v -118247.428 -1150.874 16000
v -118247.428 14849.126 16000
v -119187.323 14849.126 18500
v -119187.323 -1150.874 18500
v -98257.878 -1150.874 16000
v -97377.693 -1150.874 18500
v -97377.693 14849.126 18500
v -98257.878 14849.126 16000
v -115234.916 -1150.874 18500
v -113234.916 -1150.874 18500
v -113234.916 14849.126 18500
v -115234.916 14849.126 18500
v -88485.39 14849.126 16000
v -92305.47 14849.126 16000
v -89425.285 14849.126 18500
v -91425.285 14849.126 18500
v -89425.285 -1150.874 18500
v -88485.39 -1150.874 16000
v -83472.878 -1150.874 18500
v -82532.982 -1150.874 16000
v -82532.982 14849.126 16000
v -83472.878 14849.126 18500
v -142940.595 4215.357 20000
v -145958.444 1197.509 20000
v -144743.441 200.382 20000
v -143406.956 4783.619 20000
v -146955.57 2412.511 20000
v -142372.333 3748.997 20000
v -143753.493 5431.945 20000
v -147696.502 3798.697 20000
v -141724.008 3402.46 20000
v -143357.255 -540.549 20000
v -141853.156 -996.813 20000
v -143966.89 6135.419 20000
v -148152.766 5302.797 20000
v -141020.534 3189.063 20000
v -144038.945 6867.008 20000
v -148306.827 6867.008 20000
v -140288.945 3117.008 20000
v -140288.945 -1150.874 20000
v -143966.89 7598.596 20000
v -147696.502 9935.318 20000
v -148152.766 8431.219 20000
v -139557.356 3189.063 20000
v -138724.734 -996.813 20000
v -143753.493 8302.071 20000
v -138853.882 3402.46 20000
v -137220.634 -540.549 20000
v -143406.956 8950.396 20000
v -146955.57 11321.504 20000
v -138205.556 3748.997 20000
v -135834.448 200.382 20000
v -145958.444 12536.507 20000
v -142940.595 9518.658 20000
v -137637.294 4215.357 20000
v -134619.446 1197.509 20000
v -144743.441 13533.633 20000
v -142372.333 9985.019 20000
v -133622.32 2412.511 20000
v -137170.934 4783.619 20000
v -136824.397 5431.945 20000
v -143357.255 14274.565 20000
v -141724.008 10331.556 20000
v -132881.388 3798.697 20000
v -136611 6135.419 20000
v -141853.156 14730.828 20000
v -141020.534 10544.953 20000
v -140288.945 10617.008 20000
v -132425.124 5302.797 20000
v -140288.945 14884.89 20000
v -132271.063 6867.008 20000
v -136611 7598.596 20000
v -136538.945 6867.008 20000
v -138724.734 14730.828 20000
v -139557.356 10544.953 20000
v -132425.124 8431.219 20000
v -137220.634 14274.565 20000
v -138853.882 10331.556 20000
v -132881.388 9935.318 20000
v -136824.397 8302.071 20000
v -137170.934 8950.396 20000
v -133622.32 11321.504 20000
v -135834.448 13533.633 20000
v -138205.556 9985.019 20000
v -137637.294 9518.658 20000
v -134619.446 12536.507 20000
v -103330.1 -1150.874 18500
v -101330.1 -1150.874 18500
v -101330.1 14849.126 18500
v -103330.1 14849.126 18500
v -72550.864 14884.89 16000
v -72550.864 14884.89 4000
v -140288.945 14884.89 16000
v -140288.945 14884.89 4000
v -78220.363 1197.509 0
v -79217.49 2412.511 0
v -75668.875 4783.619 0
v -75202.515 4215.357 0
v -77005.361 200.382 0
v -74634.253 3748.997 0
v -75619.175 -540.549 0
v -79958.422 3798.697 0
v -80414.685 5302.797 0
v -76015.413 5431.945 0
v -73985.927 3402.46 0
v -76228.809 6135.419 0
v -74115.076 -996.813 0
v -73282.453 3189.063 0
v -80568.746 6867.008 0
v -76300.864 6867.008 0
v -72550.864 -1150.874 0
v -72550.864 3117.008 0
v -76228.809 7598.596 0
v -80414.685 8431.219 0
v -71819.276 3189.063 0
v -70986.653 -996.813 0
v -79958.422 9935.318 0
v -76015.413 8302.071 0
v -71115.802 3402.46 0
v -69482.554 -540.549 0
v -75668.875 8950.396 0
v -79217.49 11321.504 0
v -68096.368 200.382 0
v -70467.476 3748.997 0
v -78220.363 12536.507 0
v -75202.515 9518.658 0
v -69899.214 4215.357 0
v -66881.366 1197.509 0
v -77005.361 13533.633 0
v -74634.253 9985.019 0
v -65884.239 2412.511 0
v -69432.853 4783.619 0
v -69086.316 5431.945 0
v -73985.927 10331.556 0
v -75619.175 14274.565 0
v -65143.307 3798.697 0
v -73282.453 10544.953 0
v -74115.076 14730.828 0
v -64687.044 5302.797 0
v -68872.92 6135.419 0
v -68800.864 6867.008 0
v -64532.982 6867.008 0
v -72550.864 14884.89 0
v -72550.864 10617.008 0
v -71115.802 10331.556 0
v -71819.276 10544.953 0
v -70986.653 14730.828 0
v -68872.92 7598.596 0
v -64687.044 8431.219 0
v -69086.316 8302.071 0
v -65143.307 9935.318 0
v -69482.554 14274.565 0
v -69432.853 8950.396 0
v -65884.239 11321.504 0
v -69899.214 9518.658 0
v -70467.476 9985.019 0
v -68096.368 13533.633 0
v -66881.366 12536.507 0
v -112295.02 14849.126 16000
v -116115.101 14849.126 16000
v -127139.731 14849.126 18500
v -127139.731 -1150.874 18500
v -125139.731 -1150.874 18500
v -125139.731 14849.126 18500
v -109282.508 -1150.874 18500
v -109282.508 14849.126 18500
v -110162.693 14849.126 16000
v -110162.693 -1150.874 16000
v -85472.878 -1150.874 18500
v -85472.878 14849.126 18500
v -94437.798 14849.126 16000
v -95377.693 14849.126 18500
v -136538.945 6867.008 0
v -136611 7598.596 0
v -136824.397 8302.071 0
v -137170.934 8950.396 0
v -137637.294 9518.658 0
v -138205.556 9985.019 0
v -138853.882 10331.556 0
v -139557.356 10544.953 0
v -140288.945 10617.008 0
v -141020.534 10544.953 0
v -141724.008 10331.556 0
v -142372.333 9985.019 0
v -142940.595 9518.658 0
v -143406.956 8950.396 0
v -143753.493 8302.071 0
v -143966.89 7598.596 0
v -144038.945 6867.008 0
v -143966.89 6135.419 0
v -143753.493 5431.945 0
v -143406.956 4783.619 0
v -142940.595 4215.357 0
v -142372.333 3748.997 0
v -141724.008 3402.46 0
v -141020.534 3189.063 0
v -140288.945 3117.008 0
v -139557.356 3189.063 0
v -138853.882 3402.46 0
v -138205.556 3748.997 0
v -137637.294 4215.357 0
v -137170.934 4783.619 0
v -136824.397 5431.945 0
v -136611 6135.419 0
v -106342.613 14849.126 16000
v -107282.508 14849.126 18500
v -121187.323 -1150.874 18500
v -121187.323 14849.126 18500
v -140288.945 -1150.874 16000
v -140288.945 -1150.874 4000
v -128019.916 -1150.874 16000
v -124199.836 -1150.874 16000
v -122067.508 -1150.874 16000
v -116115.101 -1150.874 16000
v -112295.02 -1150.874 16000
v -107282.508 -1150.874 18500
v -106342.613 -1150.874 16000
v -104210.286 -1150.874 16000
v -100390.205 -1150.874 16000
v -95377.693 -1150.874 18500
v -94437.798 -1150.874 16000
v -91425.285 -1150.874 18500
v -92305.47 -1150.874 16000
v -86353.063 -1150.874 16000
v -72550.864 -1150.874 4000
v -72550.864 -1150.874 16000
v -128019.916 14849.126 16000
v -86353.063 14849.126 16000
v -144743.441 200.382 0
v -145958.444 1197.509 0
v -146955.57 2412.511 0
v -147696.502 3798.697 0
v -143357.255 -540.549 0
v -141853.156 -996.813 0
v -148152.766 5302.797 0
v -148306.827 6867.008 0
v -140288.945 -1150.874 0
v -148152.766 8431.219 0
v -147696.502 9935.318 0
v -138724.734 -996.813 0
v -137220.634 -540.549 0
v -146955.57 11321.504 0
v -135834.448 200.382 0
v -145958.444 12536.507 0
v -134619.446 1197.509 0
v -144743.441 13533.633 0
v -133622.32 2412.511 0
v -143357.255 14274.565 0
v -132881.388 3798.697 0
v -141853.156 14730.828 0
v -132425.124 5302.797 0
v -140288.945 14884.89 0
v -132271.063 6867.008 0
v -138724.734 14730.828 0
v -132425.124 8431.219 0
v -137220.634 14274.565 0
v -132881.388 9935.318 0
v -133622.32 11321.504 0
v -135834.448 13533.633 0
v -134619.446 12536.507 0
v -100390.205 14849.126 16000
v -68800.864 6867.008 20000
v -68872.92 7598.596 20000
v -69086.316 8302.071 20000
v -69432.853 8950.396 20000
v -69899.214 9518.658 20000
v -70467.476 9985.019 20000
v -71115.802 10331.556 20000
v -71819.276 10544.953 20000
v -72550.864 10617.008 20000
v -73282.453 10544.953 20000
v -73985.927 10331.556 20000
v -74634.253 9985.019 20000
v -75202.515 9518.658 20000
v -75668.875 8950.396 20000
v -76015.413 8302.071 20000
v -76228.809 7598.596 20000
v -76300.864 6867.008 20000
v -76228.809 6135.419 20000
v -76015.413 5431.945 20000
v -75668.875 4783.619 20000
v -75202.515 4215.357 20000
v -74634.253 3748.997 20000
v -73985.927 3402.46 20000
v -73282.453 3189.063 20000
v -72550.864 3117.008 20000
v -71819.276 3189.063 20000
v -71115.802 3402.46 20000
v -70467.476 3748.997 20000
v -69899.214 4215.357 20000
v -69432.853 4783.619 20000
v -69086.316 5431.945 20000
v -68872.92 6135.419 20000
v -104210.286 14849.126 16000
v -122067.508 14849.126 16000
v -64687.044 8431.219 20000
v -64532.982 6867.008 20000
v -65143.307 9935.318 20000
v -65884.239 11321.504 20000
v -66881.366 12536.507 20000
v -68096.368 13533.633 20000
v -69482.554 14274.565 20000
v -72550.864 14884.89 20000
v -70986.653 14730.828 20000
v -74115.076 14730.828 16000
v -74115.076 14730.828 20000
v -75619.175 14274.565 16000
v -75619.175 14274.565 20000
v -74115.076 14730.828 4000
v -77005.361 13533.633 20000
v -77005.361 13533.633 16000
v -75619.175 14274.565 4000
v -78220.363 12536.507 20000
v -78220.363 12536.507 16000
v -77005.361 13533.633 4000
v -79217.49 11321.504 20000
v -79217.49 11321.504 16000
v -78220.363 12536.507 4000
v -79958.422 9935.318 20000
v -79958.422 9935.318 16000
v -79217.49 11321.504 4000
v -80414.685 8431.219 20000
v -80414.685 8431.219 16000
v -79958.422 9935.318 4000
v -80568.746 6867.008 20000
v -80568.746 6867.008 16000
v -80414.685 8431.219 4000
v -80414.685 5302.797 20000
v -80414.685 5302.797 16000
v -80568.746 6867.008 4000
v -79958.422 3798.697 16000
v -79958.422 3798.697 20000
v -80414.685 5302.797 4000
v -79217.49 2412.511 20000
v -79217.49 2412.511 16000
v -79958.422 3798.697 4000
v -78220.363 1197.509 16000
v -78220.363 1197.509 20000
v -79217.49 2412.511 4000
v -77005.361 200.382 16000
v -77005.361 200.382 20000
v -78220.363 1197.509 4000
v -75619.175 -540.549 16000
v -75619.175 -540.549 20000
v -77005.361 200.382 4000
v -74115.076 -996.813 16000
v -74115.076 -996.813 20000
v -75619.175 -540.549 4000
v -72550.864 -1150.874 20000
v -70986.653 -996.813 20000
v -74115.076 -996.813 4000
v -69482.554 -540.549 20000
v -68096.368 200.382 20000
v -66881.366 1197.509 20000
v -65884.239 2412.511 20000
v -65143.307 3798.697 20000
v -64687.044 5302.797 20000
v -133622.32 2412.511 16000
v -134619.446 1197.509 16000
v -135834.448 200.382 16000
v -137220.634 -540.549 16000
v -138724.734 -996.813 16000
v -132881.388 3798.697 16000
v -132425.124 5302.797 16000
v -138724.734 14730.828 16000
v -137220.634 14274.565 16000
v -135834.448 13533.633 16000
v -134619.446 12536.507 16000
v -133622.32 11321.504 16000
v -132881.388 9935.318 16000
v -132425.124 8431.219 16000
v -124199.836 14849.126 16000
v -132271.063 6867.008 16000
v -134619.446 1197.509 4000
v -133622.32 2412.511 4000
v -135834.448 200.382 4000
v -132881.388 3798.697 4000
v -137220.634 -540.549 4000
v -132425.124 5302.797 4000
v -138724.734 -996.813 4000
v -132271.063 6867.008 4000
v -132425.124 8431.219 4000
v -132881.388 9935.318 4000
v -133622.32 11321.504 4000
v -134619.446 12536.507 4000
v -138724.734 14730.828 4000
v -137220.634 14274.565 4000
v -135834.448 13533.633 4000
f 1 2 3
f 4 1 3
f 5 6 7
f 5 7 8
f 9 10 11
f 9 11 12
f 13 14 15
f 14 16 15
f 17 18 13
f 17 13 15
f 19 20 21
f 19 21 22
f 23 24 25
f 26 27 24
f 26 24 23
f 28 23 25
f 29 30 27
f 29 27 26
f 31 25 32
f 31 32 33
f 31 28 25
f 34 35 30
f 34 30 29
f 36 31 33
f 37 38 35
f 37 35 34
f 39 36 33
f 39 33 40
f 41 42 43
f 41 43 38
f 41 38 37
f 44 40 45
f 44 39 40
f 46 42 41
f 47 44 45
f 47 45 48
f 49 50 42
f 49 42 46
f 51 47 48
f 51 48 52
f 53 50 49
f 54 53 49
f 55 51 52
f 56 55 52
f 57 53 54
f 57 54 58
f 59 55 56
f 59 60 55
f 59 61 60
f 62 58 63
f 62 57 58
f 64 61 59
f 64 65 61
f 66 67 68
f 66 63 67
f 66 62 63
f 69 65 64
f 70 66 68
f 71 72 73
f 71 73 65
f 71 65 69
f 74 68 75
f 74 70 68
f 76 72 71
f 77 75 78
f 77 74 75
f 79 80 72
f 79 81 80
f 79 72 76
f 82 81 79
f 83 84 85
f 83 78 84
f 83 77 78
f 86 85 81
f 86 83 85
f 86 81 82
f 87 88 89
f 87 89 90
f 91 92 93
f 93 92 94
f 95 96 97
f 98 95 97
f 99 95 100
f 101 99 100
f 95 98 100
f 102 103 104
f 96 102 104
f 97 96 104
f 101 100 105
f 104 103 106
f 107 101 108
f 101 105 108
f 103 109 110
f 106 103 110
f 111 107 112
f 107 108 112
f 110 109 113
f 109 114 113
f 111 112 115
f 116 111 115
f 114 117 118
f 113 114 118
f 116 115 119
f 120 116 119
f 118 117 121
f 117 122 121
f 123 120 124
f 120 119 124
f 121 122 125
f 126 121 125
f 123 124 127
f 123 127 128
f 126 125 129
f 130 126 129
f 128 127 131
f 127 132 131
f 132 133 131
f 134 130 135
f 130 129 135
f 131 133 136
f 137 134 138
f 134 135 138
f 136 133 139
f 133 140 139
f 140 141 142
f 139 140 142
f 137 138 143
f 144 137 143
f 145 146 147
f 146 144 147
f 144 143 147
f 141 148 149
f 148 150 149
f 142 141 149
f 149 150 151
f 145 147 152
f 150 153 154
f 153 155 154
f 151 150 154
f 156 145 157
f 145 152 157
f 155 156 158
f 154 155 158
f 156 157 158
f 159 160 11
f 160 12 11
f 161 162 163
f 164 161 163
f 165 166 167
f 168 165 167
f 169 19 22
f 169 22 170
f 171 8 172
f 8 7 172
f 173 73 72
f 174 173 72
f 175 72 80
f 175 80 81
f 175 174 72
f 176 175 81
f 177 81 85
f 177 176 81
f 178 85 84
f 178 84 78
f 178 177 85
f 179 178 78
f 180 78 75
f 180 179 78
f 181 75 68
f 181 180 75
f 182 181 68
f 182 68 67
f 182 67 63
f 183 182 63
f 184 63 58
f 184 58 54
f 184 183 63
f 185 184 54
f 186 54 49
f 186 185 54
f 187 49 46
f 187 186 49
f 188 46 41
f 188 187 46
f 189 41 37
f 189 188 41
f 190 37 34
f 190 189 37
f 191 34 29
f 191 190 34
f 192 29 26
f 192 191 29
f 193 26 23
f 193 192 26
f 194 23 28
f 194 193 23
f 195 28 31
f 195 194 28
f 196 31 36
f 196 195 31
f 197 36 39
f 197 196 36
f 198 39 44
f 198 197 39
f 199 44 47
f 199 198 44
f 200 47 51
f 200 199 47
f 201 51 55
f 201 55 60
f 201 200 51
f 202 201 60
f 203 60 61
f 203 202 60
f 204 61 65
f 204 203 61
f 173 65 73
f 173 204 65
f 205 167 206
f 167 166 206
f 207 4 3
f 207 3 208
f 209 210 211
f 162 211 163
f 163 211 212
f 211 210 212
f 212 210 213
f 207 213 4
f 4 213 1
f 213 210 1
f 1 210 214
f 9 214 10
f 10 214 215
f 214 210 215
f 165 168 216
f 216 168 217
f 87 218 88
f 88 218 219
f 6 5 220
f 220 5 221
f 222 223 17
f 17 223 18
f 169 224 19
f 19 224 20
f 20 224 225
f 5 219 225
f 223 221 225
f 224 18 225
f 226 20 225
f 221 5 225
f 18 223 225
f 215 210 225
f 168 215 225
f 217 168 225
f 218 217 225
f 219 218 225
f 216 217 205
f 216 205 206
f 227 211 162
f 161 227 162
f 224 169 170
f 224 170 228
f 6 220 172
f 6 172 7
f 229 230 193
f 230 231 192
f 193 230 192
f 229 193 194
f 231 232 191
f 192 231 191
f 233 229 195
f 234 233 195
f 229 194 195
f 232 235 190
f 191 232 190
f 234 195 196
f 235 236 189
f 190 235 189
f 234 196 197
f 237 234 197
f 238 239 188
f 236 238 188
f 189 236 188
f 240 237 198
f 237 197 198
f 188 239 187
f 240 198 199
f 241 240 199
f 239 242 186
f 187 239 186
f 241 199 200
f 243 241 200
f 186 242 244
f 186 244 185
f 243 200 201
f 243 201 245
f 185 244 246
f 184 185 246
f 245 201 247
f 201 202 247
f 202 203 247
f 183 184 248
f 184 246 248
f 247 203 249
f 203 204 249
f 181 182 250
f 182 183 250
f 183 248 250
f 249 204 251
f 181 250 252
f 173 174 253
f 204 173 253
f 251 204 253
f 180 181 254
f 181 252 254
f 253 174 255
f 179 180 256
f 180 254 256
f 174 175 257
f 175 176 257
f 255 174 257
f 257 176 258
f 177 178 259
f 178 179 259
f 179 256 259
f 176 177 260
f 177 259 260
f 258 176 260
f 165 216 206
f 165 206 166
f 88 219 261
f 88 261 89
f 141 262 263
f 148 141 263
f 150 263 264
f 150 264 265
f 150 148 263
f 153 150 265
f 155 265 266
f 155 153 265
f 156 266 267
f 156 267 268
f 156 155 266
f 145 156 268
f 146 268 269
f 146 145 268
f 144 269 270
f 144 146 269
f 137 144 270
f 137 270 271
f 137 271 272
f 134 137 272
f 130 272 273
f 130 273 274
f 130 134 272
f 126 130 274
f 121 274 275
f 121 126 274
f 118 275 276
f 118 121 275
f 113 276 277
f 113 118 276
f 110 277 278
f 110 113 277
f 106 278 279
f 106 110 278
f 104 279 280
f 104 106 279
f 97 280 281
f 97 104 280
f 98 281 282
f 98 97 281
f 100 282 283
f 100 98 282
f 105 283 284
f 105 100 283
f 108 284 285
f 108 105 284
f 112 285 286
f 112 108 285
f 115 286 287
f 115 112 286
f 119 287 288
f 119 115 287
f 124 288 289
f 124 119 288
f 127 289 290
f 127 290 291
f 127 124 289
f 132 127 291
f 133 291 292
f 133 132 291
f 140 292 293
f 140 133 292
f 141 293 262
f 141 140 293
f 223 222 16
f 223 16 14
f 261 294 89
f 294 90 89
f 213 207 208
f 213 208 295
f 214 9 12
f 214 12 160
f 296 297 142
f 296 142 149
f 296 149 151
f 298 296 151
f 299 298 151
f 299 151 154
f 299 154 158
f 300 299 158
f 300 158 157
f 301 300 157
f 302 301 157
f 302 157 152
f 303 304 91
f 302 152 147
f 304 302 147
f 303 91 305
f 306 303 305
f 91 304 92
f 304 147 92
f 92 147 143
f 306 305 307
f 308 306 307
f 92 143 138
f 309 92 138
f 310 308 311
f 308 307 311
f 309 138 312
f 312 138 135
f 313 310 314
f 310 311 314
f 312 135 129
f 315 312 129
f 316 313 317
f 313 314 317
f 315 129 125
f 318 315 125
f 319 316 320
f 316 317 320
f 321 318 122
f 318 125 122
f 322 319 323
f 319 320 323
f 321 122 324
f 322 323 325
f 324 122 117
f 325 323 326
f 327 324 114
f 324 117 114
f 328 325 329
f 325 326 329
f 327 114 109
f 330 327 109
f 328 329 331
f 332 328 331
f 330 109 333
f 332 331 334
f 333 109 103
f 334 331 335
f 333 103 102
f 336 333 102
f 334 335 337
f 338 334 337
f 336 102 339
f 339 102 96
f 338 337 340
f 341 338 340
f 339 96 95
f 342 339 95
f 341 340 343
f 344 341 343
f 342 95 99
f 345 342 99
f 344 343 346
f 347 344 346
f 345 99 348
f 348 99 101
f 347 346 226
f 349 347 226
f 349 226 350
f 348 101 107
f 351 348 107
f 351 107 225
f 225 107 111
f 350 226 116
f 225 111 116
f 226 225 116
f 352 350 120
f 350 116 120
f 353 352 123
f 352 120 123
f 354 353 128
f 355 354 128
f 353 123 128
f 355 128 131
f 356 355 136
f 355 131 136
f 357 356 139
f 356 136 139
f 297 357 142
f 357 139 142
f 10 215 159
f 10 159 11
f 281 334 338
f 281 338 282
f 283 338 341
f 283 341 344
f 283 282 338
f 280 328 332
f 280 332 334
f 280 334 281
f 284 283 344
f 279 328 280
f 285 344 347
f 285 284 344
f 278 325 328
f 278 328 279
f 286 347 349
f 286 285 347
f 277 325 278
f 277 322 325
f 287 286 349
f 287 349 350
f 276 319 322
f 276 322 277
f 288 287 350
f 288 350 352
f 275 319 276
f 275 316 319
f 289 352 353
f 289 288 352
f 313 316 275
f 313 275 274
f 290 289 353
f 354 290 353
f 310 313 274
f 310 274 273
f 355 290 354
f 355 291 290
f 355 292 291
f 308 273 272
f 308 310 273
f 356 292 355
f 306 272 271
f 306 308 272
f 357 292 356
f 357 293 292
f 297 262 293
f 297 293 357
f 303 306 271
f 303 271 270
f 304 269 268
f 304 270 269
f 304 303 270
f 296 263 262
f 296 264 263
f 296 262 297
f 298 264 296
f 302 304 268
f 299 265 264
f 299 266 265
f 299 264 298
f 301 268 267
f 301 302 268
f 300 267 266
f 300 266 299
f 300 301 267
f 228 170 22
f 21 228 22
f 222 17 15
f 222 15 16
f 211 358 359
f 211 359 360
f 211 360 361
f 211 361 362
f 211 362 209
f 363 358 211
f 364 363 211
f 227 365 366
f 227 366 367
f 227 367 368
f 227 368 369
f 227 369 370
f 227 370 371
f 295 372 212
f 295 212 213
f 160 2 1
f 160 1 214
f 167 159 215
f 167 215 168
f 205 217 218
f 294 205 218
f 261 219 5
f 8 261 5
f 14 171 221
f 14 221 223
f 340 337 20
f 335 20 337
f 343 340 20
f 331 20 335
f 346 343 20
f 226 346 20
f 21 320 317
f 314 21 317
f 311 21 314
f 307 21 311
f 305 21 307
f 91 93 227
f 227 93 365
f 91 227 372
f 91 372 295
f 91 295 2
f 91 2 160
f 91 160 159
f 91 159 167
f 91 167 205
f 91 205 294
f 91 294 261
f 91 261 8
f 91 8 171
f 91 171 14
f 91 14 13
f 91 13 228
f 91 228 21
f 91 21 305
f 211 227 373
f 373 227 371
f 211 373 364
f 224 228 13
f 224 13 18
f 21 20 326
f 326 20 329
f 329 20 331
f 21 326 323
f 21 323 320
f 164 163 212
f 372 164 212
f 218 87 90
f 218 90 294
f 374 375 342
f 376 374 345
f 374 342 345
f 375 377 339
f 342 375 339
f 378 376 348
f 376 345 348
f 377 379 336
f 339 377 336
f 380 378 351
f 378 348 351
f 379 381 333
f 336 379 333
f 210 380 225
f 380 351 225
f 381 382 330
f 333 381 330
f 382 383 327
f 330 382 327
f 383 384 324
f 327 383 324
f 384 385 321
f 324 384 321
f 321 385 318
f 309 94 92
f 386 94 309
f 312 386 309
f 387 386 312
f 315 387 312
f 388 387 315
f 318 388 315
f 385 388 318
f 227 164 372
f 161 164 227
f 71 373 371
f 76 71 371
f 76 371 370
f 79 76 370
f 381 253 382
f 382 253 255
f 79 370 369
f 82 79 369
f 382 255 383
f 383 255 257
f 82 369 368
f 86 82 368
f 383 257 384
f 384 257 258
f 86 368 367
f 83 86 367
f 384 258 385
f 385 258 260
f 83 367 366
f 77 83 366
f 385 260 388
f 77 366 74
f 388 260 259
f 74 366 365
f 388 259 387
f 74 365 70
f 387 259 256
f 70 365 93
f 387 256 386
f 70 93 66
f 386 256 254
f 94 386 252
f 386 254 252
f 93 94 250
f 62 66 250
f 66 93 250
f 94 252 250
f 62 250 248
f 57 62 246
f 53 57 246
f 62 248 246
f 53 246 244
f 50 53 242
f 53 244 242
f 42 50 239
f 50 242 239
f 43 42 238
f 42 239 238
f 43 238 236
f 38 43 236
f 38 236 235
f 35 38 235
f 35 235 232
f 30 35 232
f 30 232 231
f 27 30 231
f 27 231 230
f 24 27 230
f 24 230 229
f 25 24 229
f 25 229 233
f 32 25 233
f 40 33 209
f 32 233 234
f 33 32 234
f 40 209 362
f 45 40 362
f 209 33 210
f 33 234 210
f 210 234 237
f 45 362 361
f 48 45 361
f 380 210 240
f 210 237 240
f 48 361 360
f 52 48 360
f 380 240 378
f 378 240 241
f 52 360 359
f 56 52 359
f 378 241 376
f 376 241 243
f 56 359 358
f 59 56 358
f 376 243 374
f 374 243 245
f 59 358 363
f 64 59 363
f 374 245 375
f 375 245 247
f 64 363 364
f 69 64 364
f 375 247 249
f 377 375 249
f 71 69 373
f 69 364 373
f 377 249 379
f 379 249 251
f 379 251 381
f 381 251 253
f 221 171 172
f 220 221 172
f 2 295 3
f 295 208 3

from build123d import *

# Parameters (mm, degrees)
SKETCH3_R             = 8017.882060266
SKETCH3_R_2           = 3750
BOSS_EXTRUDE1_DEPTH   = 20000
BOSS_EXTRUDE1_2_DEPTH = 20000
BOSS_EXTRUDE2_START   = 4000
BOSS_EXTRUDE2_DEPTH   = 12000
BOSS_EXTRUDE3_DEPTH   = 16000


with BuildPart() as part:
    # Sketch3 → Boss-Extrude1 (new body)
    with BuildSketch(Plane.XY):
        with Locations((-140288.944796633, 6867.007771622)):
            Circle(SKETCH3_R)
        with Locations((-140288.944796633, 6867.007771622)):
            Circle(SKETCH3_R_2, mode=Mode.SUBTRACT)
    extrude(amount=BOSS_EXTRUDE1_DEPTH)



with BuildPart() as body_2:
    # Sketch3 → Boss-Extrude1 2 (new body)
    with BuildSketch(Plane.XY):
        with Locations((-72550.864388804, 6867.007771622)):
            Circle(SKETCH3_R)
        with Locations((-72550.864388804, 6867.007771622)):
            Circle(SKETCH3_R_2, mode=Mode.SUBTRACT)
    extrude(amount=BOSS_EXTRUDE1_2_DEPTH)


with BuildPart() as part_1:
    add(part.part)

    add(body_2.part)  # Boss-Extrude2 merges body 2
    # Sketch4 → Boss-Extrude2 (add)
    with BuildSketch(Plane.XY.offset(BOSS_EXTRUDE2_START)):
        with BuildLine():
            Line((-72550.864388804, 14884.889831888), (-140288.944796633, 14884.889831888))
            ThreePointArc((-140288.944796633, 14884.889831888), (-132271.062736367, 6867.007771622), (-140288.944796633, -1150.874288644))
            Line((-140288.944796633, -1150.874288644), (-72550.864388804, -1150.874288644))
            ThreePointArc((-72550.864388804, -1150.874288644), (-80568.74644907, 6867.007771622), (-72550.864388804, 14884.889831888))
        make_face()
    extrude(amount=BOSS_EXTRUDE2_DEPTH)

    # Sketch6 → Boss-Extrude3 (add)
    with BuildSketch(Plane.XZ.offset(1150.874288644)):
        Polygon((-122067.508437156, 16000), (-118247.428096981, 16000), (-119187.323278513, 18500), (-121187.323278513, 18500), align=None)
        Polygon((-116115.100809082, 16000), (-112295.020468907, 16000), (-113234.915650439, 18500), (-115234.915650439, 18500), align=None)
        Polygon((-110162.693181009, 16000), (-106342.612840833, 16000), (-107282.508022365, 18500), (-109282.508022365, 18500), align=None)
        Polygon((-104210.285552935, 16000), (-100390.205212759, 16000), (-101330.100394292, 18500), (-103330.100394292, 18500), align=None)
        Polygon((-98257.877924861, 16000), (-94437.797584686, 16000), (-95377.692766218, 18500), (-97377.692766218, 18500), align=None)
        Polygon((-92305.470296787, 16000), (-88485.389956612, 16000), (-89425.285138144, 18500), (-91425.285138144, 18500), align=None)
        Polygon((-85472.87751007, 18500), (-86353.062668713, 16000), (-82532.982328538, 16000), (-83472.87751007, 18500), align=None)
        Polygon((-128019.91606523, 16000), (-127139.730906587, 18500), (-125139.730906587, 18500), (-124199.835725055, 16000), align=None)
    extrude(amount=-BOSS_EXTRUDE3_DEPTH)


solid = part_1.part
